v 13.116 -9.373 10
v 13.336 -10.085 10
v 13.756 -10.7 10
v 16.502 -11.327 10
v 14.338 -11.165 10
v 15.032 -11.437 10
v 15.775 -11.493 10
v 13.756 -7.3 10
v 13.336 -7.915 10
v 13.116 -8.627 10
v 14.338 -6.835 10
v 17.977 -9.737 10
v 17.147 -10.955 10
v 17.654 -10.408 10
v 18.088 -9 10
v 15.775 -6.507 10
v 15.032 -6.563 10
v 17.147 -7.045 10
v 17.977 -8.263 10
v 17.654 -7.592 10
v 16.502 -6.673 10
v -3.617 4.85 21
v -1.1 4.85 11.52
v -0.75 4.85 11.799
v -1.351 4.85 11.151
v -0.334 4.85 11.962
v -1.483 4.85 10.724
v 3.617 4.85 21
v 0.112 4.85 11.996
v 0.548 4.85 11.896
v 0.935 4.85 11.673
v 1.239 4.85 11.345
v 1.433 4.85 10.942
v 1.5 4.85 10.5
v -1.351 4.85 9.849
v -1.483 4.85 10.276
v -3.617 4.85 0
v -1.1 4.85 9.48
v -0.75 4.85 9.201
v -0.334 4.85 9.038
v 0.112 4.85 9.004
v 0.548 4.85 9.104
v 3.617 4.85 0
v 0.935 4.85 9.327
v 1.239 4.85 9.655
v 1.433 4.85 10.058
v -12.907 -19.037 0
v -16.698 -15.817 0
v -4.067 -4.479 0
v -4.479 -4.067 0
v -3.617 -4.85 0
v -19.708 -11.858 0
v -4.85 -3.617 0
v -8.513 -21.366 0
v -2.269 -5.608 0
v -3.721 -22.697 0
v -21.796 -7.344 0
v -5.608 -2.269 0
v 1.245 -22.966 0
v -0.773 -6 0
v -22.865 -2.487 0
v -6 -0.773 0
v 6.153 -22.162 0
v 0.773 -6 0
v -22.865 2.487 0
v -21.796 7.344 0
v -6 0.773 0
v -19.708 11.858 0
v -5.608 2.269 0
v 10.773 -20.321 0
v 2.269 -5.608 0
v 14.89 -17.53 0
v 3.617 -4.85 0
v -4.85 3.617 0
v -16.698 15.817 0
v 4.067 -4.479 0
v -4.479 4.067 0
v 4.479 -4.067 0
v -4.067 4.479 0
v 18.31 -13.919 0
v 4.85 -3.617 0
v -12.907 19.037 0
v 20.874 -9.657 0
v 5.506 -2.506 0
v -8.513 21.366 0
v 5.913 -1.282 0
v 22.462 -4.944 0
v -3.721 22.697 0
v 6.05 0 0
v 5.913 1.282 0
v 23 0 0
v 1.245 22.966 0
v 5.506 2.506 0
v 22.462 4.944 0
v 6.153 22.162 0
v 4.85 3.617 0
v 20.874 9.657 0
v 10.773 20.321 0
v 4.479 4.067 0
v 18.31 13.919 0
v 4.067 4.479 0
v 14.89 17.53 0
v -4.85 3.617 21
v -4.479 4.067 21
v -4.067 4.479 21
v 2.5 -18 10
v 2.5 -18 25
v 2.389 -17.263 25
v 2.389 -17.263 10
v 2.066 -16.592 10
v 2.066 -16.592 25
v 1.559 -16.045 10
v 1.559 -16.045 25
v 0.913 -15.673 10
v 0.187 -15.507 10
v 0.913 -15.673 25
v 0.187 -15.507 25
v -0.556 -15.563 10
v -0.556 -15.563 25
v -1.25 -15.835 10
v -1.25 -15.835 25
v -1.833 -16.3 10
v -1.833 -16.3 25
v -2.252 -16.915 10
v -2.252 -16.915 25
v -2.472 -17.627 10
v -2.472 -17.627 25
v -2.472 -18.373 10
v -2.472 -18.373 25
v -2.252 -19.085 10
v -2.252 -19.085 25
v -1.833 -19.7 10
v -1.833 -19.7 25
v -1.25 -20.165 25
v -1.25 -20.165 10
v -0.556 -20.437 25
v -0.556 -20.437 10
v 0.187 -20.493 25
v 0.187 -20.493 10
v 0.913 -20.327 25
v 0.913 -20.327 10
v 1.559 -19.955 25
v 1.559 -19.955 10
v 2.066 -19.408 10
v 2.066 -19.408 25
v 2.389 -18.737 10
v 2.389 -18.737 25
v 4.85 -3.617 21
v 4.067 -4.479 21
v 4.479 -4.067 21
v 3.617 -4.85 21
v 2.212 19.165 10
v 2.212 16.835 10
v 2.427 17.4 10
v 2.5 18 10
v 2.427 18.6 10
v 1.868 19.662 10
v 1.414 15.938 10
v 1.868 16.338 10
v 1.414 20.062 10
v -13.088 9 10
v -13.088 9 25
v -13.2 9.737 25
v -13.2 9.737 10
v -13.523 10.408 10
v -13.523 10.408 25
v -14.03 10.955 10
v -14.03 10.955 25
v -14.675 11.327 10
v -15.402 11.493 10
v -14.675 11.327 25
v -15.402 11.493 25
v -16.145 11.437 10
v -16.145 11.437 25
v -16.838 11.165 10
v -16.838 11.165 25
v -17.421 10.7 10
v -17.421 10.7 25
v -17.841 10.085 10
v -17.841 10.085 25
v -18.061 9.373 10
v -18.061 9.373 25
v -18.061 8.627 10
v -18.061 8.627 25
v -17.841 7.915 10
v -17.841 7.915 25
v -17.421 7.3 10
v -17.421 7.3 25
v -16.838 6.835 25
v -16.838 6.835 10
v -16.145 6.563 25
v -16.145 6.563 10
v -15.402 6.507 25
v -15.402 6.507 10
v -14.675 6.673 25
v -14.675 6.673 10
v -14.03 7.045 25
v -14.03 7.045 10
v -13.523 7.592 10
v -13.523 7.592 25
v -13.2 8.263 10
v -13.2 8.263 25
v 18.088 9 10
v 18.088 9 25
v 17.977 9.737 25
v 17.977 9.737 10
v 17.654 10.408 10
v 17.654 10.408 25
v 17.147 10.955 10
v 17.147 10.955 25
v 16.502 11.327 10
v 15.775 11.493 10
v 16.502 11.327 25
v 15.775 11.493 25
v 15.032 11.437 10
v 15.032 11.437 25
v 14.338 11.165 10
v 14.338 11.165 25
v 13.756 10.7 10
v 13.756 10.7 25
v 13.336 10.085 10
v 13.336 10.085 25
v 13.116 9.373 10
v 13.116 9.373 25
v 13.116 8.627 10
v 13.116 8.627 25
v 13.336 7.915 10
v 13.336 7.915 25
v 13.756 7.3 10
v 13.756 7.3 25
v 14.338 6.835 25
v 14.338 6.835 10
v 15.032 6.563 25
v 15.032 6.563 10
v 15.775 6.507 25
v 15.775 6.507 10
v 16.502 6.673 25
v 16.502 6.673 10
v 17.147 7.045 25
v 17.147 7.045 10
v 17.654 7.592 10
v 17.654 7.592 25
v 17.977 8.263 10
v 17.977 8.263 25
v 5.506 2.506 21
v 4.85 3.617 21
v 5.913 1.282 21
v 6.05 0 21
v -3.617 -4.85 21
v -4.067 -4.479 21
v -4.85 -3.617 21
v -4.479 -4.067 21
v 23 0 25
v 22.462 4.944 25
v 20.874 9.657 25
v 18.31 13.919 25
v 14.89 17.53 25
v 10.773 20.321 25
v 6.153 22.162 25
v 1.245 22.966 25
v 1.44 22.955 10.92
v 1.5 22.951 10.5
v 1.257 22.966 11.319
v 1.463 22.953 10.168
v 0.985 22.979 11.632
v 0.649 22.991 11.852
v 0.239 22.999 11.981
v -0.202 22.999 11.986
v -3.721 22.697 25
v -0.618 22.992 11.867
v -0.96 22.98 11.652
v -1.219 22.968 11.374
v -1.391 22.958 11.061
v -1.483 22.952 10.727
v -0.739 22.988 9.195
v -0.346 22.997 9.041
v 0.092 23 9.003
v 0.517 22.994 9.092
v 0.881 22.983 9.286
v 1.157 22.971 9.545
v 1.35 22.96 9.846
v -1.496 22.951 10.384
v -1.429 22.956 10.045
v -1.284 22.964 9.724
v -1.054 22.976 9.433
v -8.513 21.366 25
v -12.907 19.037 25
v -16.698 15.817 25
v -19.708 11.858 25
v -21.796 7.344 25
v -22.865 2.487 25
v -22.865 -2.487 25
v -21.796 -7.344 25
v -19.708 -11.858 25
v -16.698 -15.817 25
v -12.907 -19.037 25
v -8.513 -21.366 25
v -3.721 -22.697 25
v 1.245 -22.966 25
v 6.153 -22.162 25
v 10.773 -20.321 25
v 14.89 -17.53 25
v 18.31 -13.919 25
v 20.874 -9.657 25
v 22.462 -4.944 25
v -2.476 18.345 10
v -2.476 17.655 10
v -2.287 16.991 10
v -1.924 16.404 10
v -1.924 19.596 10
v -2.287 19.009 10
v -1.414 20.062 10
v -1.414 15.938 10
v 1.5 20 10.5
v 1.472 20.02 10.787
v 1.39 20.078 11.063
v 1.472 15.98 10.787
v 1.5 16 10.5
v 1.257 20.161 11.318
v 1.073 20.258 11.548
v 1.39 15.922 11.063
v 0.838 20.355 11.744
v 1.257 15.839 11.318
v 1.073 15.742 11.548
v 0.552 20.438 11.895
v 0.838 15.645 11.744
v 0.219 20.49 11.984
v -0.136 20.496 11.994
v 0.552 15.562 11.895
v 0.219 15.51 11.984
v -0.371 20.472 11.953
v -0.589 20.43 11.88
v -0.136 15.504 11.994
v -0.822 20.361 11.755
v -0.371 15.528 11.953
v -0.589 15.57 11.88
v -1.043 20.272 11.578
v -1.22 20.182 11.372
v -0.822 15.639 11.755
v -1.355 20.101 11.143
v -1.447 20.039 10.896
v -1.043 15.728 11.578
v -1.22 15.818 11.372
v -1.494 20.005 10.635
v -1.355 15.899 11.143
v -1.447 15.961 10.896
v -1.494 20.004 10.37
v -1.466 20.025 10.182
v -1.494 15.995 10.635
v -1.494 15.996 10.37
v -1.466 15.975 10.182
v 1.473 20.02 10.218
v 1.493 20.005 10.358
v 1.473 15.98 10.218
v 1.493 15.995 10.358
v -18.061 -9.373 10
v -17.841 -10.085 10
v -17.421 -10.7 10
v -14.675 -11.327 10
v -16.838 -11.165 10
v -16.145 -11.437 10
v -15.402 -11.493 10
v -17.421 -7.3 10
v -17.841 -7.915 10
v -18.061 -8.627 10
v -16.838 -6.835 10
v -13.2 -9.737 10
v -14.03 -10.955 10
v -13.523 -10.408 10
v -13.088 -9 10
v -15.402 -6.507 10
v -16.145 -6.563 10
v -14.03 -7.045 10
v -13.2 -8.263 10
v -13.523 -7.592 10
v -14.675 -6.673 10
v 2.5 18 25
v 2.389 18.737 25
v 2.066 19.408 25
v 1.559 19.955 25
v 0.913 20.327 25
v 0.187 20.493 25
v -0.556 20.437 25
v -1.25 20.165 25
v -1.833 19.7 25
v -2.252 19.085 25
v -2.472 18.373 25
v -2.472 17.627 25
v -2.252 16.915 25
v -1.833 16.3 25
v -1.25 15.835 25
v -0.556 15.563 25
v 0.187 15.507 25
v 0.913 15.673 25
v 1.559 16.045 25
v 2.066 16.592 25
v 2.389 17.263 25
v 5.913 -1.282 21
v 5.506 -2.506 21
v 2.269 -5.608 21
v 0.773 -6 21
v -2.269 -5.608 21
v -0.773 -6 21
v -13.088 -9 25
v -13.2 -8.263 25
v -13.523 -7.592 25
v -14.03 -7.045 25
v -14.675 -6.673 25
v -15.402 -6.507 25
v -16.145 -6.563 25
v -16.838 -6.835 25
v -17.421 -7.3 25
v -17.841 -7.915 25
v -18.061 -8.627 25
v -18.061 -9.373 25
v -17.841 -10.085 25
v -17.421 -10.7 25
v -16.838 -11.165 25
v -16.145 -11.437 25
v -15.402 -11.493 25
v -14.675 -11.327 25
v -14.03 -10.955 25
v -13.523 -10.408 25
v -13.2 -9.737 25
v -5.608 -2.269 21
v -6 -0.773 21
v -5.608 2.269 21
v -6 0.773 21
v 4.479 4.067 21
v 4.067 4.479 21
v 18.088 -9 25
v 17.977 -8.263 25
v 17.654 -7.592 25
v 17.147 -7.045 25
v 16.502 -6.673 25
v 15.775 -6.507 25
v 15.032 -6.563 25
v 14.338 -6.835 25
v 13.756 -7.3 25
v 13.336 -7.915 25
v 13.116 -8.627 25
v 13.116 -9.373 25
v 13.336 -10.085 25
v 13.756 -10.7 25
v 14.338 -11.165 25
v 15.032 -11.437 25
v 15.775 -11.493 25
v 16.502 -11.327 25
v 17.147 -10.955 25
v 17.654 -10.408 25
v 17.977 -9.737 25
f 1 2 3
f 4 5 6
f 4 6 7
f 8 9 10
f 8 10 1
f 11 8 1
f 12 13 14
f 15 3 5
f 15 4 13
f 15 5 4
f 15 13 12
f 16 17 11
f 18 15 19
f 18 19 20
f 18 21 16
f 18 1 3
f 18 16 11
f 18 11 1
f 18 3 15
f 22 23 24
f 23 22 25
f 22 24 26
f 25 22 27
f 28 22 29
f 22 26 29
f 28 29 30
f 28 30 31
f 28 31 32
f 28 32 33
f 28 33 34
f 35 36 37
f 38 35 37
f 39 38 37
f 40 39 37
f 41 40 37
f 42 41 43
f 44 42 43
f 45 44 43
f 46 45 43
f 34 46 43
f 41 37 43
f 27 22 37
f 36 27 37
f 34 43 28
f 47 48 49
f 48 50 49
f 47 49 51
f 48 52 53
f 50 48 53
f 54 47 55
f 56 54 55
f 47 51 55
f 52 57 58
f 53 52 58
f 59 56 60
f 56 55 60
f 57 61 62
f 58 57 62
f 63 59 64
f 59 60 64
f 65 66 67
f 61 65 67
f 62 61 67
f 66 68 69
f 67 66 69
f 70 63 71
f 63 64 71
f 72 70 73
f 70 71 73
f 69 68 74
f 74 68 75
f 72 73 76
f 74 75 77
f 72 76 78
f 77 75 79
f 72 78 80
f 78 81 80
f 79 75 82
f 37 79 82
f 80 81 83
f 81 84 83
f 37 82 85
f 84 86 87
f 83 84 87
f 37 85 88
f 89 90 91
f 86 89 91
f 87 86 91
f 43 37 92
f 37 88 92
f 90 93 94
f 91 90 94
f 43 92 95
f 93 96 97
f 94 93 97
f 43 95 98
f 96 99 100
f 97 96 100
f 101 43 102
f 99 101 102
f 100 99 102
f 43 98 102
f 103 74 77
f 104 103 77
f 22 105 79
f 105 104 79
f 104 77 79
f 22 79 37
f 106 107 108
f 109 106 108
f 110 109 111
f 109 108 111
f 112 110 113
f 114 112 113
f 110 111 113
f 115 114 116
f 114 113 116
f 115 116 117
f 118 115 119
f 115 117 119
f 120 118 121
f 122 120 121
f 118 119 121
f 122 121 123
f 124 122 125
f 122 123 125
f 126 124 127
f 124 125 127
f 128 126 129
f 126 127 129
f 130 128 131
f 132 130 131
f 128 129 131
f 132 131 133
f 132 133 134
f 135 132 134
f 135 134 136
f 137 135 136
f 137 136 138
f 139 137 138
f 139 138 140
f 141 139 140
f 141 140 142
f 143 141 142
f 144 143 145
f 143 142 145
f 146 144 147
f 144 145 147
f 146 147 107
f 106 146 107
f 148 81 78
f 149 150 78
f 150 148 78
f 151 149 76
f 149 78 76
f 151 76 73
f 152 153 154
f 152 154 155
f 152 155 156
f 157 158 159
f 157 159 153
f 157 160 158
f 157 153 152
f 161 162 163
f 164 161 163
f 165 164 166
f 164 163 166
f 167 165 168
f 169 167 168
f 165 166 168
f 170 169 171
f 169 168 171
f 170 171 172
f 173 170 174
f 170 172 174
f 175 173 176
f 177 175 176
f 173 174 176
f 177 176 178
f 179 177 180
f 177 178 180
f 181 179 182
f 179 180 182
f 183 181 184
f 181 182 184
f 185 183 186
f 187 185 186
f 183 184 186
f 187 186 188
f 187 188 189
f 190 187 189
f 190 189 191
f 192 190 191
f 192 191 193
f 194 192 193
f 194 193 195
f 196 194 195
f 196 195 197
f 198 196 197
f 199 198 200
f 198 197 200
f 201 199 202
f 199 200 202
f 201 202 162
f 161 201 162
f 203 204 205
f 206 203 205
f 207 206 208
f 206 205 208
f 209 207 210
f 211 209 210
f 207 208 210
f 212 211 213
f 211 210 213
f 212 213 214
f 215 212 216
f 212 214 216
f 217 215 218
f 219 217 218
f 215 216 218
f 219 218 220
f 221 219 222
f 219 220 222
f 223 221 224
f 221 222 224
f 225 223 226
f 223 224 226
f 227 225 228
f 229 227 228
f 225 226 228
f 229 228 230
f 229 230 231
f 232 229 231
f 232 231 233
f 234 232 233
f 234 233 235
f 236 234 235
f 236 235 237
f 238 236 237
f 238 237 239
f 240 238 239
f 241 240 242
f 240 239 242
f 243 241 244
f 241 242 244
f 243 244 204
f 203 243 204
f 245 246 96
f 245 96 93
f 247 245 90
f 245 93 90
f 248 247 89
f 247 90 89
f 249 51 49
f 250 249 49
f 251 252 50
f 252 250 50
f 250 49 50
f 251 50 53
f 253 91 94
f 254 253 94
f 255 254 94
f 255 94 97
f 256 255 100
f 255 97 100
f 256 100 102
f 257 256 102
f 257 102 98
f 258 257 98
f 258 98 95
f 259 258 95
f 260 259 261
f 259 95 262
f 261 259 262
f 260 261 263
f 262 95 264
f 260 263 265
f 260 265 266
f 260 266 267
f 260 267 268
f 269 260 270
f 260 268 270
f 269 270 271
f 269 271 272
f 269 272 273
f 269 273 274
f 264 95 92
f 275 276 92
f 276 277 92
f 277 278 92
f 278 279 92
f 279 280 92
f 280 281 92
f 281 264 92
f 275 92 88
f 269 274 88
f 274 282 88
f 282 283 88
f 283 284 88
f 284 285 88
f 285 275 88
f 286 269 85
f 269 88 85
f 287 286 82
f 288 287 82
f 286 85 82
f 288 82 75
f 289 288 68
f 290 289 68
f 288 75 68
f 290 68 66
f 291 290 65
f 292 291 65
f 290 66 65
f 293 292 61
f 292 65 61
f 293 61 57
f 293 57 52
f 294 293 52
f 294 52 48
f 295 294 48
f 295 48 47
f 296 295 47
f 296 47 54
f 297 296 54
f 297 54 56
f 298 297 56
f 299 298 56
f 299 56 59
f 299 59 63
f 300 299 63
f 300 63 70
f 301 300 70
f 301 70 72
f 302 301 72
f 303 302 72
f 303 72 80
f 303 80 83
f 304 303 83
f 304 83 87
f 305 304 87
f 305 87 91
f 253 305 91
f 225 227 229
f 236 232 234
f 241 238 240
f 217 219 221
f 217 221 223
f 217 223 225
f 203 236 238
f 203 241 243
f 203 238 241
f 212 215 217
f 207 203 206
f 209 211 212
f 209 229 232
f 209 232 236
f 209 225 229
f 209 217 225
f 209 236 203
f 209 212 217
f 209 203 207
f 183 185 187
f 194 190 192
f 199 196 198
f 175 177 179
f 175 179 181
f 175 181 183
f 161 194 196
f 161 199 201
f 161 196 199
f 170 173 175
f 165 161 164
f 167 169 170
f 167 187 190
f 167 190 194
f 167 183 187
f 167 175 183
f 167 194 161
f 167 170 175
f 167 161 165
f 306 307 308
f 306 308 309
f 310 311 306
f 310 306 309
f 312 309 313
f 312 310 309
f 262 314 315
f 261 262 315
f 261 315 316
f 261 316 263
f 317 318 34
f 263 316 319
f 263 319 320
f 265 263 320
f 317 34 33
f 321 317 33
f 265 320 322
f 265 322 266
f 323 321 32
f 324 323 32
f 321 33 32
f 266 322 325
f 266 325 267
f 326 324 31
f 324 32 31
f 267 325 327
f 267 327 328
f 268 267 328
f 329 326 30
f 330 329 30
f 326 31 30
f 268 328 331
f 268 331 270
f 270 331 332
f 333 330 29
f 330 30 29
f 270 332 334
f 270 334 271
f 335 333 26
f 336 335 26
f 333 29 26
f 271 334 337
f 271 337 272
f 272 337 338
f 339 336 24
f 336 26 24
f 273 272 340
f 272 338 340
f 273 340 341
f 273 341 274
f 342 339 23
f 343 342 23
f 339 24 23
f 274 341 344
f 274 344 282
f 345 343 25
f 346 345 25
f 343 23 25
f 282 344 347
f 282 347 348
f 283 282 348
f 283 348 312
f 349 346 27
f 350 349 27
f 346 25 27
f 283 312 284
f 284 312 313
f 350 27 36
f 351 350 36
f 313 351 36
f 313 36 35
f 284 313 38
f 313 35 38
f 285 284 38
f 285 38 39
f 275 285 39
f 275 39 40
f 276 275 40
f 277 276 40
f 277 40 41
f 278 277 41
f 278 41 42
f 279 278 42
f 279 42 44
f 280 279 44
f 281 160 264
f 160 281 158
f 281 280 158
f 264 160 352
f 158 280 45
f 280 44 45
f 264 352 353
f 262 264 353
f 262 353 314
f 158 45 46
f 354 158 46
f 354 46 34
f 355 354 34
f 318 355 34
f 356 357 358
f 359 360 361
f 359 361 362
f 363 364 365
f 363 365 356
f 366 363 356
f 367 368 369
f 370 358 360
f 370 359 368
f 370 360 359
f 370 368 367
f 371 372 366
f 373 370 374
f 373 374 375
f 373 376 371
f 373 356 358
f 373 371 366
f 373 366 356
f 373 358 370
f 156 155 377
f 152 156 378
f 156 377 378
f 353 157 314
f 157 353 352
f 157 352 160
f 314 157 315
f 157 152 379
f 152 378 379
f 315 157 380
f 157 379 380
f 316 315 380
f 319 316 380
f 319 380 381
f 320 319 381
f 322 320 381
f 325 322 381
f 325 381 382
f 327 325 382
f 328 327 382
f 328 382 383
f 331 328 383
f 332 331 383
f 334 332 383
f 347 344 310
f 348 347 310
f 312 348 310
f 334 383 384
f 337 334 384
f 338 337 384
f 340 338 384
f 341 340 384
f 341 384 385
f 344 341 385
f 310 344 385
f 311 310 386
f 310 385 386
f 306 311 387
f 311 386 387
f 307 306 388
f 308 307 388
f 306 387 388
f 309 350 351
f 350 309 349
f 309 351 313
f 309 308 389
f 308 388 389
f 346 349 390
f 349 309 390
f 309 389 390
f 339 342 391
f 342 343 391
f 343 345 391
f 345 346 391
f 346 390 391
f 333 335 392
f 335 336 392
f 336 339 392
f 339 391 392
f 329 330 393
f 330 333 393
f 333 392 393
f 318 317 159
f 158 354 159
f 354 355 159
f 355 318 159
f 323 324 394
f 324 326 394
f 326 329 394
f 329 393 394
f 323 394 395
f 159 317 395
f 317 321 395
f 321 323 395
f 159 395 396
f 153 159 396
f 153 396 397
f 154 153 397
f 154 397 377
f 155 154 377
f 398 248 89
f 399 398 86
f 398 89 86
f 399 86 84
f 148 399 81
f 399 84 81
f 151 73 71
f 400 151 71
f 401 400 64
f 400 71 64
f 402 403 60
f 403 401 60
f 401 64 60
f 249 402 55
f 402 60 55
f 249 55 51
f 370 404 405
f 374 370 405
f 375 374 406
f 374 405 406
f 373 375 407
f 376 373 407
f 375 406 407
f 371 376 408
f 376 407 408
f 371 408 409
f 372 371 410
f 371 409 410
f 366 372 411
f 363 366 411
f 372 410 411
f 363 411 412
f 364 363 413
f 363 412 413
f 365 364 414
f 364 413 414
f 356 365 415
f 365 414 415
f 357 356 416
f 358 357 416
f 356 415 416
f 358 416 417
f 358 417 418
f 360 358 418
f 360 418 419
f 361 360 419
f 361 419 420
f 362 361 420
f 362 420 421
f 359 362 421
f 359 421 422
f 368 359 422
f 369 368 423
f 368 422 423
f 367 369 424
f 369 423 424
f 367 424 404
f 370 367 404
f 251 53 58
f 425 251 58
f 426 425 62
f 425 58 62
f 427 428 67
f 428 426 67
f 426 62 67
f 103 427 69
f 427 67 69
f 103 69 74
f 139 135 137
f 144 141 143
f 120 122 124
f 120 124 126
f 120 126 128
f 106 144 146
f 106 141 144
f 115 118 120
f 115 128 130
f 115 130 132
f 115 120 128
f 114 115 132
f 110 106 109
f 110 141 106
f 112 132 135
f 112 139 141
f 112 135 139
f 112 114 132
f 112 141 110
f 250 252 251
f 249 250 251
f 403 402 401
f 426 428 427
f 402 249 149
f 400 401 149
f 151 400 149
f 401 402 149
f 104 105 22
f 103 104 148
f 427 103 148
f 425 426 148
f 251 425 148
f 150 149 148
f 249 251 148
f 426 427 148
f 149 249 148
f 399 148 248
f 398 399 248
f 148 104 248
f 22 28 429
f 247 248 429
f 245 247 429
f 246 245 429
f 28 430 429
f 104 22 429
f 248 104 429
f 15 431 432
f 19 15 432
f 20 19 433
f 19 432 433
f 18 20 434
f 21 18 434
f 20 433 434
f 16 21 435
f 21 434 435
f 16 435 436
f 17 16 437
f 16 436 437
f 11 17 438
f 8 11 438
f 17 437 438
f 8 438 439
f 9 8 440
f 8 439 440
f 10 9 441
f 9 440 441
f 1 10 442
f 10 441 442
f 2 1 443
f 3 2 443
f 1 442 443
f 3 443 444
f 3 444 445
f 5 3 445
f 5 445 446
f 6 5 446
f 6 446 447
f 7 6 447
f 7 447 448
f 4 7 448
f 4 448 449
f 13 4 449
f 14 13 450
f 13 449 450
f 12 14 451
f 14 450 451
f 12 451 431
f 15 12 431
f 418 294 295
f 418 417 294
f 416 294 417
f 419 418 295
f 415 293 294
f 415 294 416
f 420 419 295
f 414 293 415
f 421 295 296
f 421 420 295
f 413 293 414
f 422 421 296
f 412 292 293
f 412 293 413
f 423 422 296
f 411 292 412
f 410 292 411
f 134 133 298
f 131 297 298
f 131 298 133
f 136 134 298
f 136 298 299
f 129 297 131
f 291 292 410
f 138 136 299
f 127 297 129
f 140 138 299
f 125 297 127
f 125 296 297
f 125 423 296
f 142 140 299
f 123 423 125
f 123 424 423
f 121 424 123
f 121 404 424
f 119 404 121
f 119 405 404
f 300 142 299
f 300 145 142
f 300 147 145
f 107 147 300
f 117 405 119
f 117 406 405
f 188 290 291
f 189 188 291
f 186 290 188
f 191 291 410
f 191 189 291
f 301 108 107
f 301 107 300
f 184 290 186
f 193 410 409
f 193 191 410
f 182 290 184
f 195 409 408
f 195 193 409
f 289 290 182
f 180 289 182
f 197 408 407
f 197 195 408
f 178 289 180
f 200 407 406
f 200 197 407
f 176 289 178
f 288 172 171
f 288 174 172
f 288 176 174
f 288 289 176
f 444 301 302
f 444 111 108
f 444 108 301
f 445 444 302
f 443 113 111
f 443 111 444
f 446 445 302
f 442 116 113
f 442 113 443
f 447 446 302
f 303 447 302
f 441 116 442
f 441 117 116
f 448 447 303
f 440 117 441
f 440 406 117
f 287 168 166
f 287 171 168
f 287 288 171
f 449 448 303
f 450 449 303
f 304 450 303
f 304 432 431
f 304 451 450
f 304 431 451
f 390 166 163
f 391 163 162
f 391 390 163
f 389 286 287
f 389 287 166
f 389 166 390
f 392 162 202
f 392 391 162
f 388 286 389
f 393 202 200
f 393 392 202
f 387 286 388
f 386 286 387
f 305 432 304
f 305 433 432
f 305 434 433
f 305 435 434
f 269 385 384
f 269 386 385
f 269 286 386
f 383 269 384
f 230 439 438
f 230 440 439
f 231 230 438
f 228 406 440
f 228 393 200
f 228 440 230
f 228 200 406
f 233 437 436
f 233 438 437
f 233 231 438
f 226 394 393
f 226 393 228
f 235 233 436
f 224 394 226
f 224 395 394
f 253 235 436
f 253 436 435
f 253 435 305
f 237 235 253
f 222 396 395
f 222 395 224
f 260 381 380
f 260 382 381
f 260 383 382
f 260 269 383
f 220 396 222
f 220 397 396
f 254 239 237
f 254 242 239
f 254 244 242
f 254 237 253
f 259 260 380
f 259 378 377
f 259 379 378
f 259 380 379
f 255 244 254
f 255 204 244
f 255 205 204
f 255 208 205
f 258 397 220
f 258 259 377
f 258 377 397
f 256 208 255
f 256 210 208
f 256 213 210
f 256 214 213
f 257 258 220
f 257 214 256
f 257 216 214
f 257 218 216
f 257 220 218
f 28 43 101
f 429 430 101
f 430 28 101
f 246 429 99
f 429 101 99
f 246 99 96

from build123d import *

# Parameters (mm, degrees)
F0_R     = 23
F4_DEPTH = 25
F6_R     = 2.5
F1_DEPTH = 15
F2_DEPTH = 4
F8_R     = 1.5
F3_DEPTH = 35


# Not quite as in the source:
# - a feature names something its author has since deleted; it is built from what else it names


with BuildPart() as f4:
    # F0 (on Top) → F4 (new body)
    with BuildSketch(Plane.XY):
        Circle(F0_R)
        with BuildLine():
            ThreePointArc((4.85, 3.616628264), (5.7421685799, 1.9052558883), (6.05, 0))
            ThreePointArc((6.05, 0), (5.7421685799, -1.9052558883), (4.85, -3.616628264))
            Line((4.85, -3.616628264), (4.85, -4.85))
            Line((4.85, -4.85), (3.616628264, -4.85))
            ThreePointArc((3.616628264, -4.85), (0, -6.05), (-3.616628264, -4.85))
            Line((-3.616628264, -4.85), (-4.85, -4.85))
            Line((-4.85, -4.85), (-4.85, -3.616628264))
            ThreePointArc((-4.85, -3.616628264), (-6.05, 0), (-4.85, 3.616628264))
            Line((-4.85, 3.616628264), (-4.85, 4.85))
            Line((-4.85, 4.85), (-3.616628264, 4.85))
            ThreePointArc((-3.616628264, 4.85), (0, 6.05), (3.616628264, 4.85))
            Line((3.616628264, 4.85), (4.85, 4.85))
            Line((4.85, 4.85), (4.85, 3.616628264))
        make_face(mode=Mode.SUBTRACT)
        with BuildLine():
            ThreePointArc((3.616628264, 4.85), (4.2779960262, 4.2779960262), (4.85, 3.616628264))
            Line((4.85, 3.616628264), (4.85, 4.85))
            Line((4.85, 4.85), (3.616628264, 4.85))
        make_face()
        with BuildLine():
            Line((-3.616628264, 4.85), (3.616628264, 4.85))
            ThreePointArc((3.616628264, 4.85), (0, 6.05), (-3.616628264, 4.85))
        make_face()
        with BuildLine():
            ThreePointArc((-4.85, 3.616628264), (-4.2779960262, 4.2779960262), (-3.616628264, 4.85))
            Line((-3.616628264, 4.85), (-4.85, 4.85))
            Line((-4.85, 4.85), (-4.85, 3.616628264))
        make_face()
        with BuildLine():
            Line((-4.85, -4.85), (-3.616628264, -4.85))
            ThreePointArc((-3.616628264, -4.85), (-4.2779960262, -4.2779960262), (-4.85, -3.616628264))
            Line((-4.85, -3.616628264), (-4.85, -4.85))
        make_face()
        with BuildLine():
            Line((4.85, -4.85), (4.85, -3.616628264))
            ThreePointArc((4.85, -3.616628264), (4.2779960262, -4.2779960262), (3.616628264, -4.85))
            Line((3.616628264, -4.85), (4.85, -4.85))
        make_face()
    extrude(amount=F4_DEPTH)

    # F6 (on face) → F1 (cut)
    with BuildSketch(Plane.XY.offset(25)):
        with Locations((15.5884572681, 9)):
            Circle(F6_R)
        with Locations((0, 18)):
            Circle(F6_R)
        with Locations((-15.5884572681, 9)):
            Circle(F6_R)
        with Locations((15.5884572681, -9)):
            Circle(F6_R)
        with Locations((0, -18)):
            Circle(F6_R)
        with Locations((-15.5884572681, -9)):
            Circle(F6_R)
    extrude(amount=-F1_DEPTH, mode=Mode.SUBTRACT)

    # F7 (on face) → F2 (join)
    with BuildSketch(Plane.XY.offset(25)):
        with BuildLine():
            Line((3.616628264, 4.85), (-3.616628264, 4.85))
            ThreePointArc((-3.616628264, 4.85), (0, -6.05), (3.616628264, 4.85))
        make_face()
    extrude(amount=-F2_DEPTH)

    # F8 (on face) → F3 (cut)
    with BuildSketch(Plane.XZ.offset(-4.85)):
        with Locations((0, 10.5)):
            Circle(F8_R)
    extrude(amount=-F3_DEPTH, mode=Mode.SUBTRACT)


solid = f4.part
